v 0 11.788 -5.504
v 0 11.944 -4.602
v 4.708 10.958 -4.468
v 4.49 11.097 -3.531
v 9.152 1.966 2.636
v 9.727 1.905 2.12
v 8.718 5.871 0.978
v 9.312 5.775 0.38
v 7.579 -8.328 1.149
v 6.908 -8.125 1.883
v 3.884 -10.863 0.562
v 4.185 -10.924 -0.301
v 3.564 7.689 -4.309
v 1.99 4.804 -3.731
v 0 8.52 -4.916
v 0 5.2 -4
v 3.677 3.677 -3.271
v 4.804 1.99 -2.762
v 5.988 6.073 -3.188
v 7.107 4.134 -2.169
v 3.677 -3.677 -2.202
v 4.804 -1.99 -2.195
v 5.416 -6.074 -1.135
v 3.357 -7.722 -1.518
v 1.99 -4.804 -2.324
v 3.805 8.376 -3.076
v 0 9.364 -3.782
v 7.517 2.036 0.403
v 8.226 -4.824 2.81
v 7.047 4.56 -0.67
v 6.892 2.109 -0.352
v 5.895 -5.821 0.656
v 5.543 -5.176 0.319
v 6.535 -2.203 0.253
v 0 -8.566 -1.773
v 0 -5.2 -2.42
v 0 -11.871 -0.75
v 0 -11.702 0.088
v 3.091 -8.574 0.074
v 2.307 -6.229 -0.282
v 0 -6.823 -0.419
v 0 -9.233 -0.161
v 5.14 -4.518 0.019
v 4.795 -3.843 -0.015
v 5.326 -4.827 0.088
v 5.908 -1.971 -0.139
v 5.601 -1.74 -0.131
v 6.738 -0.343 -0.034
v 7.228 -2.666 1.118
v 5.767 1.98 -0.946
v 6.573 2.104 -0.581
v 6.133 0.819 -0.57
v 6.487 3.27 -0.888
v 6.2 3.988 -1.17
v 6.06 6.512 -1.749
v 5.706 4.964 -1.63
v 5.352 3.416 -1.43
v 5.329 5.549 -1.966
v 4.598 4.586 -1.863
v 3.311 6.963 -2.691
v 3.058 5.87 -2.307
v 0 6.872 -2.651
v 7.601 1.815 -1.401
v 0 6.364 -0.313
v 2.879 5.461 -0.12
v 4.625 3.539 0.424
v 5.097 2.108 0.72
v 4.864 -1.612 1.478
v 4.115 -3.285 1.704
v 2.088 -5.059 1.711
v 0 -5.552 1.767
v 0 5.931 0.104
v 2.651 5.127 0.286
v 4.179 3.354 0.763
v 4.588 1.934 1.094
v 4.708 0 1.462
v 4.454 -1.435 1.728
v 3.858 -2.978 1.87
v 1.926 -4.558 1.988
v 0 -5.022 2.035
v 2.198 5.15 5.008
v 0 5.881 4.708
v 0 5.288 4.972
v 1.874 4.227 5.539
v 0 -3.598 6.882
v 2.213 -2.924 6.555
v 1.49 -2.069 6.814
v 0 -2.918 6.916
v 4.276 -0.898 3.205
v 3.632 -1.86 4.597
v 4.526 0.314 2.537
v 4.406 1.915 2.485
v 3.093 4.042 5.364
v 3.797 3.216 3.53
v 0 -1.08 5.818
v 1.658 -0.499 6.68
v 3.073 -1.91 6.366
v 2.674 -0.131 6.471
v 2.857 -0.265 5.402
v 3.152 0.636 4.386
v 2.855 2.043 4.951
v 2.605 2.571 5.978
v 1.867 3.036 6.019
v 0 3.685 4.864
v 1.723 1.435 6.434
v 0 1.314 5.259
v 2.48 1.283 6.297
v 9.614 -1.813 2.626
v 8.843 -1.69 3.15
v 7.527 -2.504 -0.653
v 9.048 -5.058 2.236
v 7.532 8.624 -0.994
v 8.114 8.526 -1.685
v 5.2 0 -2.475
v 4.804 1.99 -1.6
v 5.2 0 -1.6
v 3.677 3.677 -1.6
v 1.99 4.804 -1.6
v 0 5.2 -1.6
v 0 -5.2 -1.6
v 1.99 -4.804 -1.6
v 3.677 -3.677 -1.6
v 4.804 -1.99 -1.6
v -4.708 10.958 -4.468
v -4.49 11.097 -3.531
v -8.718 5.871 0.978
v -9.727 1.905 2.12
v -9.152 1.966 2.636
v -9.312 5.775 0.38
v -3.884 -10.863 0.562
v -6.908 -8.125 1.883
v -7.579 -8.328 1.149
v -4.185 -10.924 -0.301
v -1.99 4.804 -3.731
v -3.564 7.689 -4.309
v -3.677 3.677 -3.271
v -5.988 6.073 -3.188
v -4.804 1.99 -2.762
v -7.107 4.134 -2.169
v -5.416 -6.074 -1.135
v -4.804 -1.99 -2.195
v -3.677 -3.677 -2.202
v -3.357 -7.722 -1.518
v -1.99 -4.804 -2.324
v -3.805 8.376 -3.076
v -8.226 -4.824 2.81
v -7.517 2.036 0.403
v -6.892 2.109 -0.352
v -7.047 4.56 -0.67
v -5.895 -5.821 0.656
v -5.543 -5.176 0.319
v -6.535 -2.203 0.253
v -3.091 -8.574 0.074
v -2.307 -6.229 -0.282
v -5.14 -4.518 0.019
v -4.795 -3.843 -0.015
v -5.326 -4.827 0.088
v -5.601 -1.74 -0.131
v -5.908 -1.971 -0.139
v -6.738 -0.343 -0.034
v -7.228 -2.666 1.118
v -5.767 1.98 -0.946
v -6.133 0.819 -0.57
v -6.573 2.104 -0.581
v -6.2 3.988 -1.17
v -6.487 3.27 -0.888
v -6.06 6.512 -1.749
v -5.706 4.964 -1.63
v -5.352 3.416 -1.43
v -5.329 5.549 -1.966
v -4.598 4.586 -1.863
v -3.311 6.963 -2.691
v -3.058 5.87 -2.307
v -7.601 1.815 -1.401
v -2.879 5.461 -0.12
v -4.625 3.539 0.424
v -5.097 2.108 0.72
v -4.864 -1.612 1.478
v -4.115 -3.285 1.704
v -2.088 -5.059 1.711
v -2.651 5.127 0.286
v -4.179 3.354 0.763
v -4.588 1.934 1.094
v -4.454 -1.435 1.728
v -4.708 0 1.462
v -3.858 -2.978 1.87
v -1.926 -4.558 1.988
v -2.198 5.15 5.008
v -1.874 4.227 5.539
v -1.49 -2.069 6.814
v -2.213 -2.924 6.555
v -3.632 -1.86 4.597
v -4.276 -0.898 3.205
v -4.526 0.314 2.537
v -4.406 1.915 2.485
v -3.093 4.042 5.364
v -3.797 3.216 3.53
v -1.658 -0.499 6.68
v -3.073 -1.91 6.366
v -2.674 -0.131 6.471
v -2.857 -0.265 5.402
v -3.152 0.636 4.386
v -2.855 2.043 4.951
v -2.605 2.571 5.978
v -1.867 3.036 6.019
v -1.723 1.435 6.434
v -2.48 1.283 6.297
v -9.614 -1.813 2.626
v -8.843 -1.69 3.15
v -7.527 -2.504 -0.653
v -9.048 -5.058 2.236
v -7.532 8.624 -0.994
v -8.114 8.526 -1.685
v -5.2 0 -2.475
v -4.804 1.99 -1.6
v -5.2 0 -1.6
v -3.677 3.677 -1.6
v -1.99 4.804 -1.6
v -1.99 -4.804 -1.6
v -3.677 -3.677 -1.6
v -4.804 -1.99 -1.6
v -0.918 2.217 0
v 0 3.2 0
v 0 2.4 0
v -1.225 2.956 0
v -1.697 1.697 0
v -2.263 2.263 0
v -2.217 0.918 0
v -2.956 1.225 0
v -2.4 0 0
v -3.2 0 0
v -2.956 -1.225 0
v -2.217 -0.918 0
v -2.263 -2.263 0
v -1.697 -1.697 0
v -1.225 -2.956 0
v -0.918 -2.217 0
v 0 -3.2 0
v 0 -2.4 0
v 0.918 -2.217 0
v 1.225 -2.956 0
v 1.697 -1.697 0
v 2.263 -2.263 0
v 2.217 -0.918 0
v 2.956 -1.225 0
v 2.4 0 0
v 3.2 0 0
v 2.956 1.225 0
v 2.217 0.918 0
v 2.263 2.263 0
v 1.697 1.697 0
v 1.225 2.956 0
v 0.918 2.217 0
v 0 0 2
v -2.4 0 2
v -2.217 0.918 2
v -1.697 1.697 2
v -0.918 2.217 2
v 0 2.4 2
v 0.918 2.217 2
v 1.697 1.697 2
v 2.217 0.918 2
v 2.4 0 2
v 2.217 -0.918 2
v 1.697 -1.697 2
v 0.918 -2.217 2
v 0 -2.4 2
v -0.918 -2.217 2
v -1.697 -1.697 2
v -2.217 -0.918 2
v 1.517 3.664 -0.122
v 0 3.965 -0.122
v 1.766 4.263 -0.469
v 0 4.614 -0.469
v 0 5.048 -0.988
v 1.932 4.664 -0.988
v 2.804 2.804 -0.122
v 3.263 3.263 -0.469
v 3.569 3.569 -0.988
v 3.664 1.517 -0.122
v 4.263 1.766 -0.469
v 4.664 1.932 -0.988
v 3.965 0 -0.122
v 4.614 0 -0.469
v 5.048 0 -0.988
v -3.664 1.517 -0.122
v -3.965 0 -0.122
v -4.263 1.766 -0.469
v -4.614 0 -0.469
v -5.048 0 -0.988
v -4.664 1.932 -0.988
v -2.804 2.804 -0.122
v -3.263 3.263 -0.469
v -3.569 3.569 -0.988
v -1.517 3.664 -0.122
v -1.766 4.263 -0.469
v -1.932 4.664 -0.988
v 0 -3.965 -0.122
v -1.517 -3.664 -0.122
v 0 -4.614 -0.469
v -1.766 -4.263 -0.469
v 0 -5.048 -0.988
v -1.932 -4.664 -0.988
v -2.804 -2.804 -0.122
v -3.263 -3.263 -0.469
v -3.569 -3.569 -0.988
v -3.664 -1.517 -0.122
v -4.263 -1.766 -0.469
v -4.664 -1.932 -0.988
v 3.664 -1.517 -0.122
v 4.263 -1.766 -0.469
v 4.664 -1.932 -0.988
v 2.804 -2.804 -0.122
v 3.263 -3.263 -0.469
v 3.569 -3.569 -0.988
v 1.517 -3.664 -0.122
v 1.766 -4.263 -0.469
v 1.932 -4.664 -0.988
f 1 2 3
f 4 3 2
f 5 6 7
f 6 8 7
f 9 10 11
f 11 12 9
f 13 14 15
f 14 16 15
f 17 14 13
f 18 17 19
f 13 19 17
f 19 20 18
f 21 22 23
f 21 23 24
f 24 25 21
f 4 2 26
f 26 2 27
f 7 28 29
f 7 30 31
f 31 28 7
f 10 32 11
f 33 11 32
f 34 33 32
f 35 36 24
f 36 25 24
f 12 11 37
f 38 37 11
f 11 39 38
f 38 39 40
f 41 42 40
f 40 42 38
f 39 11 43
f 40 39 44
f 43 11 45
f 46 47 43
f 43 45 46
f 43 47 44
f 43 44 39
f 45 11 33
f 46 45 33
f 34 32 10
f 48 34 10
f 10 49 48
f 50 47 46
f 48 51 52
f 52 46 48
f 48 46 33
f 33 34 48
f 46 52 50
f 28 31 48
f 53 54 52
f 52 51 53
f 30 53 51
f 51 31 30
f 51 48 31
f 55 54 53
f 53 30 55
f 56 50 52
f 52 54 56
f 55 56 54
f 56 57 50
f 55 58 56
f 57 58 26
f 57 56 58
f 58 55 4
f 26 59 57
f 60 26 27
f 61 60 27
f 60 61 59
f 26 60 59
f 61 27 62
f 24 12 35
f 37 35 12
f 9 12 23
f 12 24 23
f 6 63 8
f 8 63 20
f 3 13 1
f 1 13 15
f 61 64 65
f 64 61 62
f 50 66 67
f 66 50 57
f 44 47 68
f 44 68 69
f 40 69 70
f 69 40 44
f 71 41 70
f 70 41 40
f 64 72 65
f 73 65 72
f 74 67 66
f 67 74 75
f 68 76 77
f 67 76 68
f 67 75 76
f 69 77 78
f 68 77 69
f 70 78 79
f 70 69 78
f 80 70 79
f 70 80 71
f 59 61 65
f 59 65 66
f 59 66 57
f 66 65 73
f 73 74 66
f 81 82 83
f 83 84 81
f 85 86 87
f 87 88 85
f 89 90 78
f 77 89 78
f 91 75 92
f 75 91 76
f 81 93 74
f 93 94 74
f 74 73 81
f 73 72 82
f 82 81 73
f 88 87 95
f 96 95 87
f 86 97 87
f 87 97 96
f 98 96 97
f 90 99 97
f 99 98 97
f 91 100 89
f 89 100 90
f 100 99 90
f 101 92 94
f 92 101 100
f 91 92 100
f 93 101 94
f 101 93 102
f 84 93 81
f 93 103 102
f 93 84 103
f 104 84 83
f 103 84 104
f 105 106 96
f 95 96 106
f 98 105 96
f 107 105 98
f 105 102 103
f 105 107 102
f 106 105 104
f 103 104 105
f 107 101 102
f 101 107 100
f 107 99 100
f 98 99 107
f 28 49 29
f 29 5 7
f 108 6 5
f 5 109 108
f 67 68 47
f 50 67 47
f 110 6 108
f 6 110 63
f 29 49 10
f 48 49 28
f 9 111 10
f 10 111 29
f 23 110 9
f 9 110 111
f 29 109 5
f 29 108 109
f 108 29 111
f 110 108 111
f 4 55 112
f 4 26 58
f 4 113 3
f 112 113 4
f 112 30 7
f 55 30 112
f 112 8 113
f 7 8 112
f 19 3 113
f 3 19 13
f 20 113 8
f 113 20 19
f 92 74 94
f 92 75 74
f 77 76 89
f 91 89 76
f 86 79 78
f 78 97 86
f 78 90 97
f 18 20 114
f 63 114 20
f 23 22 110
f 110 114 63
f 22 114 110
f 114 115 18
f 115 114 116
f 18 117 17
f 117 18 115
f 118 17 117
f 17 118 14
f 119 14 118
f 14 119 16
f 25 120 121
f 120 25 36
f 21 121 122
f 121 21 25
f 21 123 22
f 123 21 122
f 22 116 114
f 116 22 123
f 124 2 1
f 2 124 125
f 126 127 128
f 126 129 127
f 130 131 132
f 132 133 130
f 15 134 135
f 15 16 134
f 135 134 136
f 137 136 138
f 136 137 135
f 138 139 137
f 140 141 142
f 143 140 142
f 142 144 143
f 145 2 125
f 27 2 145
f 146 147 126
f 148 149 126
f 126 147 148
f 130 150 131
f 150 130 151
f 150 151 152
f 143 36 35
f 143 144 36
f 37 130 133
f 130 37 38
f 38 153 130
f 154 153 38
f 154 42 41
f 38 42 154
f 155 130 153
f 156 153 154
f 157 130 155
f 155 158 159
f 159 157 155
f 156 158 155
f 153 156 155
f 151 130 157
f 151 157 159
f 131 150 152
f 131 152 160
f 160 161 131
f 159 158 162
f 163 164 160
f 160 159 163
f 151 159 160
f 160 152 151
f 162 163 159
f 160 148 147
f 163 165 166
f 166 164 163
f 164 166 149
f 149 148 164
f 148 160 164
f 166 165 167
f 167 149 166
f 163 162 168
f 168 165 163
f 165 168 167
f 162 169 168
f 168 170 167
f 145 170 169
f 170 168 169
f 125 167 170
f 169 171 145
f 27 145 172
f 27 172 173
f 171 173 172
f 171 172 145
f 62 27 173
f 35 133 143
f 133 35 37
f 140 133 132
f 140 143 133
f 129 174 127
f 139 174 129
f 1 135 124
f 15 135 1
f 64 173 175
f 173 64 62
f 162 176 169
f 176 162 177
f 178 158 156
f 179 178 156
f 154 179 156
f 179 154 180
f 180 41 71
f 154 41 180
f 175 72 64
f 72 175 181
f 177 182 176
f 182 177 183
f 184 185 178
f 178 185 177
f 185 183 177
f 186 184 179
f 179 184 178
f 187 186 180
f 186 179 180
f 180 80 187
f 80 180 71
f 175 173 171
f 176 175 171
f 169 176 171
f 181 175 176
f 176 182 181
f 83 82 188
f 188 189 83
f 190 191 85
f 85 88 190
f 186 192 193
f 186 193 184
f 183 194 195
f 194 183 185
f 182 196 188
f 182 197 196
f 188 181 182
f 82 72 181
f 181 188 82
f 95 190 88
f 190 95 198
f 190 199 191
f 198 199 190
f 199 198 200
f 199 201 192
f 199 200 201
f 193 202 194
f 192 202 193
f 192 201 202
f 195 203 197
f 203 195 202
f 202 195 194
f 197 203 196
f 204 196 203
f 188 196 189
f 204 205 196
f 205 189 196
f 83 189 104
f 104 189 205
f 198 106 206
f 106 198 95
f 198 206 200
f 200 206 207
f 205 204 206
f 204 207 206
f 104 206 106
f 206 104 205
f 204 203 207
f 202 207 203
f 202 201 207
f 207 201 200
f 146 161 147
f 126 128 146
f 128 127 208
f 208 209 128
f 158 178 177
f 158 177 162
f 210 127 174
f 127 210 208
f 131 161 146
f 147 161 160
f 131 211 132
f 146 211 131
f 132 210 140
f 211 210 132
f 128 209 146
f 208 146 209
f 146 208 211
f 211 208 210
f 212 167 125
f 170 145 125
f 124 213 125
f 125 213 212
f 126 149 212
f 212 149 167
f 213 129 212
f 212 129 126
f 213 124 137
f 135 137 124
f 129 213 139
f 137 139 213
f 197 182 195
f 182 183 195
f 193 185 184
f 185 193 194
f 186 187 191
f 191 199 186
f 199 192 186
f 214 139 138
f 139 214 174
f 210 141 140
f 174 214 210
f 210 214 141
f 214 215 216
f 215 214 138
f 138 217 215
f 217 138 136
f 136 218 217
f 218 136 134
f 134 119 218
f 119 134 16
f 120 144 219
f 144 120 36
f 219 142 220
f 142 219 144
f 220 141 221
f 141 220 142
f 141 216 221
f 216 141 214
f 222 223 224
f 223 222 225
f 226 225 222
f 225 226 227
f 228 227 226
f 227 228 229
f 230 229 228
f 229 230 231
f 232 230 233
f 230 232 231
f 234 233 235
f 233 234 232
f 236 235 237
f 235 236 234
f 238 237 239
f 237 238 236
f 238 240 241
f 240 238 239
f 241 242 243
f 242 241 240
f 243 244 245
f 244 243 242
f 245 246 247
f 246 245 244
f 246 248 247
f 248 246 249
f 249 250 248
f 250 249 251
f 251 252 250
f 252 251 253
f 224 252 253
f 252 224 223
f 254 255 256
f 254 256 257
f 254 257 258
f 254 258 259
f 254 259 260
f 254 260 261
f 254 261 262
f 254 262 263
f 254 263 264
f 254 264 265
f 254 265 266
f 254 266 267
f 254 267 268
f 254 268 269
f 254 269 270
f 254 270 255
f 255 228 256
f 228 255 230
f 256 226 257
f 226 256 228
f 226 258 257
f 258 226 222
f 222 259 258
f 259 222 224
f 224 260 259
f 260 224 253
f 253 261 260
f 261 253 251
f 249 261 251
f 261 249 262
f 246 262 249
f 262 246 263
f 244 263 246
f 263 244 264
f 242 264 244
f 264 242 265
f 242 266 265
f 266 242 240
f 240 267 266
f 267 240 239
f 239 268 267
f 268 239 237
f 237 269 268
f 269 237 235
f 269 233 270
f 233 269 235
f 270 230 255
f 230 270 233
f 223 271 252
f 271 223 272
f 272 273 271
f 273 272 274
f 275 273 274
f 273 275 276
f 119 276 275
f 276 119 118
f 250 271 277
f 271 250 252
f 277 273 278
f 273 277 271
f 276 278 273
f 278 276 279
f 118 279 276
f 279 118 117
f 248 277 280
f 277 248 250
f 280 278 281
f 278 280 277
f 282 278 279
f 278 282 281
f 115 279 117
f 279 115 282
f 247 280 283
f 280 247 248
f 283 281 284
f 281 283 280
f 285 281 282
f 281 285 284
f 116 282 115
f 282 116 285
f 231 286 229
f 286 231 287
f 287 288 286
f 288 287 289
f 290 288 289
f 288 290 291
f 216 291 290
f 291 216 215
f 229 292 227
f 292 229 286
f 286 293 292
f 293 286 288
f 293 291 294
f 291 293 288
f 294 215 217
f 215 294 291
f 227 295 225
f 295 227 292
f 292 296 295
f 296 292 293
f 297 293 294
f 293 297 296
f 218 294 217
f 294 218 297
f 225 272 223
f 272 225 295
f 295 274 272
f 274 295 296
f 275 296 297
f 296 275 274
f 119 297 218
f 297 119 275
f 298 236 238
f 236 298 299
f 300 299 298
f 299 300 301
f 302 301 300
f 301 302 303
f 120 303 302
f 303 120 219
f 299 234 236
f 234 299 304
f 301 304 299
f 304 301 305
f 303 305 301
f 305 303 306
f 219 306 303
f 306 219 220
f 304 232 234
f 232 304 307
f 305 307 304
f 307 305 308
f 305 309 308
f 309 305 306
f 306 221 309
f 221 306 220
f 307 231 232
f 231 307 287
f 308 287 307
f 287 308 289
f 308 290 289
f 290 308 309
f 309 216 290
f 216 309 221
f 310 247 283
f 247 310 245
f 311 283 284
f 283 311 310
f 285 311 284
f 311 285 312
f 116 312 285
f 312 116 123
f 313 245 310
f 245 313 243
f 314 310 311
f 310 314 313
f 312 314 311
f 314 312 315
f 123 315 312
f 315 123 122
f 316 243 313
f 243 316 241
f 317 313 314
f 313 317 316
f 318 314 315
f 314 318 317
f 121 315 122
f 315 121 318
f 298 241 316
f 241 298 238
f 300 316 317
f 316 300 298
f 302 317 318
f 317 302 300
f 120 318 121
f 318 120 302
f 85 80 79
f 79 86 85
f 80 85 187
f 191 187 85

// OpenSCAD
use <../lib.scad>
use <s/15424s01.scad>
function ldraw_lib__15424() = [
// 0 Minifig Hat Cowboy Type 2
// 0 Name: 15424.dat
// 0 Author: Magnus Forsberg [MagFors]
// 0 !LDRAW_ORG Part UPDATE 2023-01
// 0 !LICENSE Licensed under CC BY 4.0 : see CAreadme.txt
// 
// 0 BFC CERTIFY CCW
  [0,"BFC","CERTIFY"],
  [0,"BFC","CCW"],
// 
// 0 !CATEGORY Minifig Headwear
// 
// 0 !HISTORY 2014-05-16 {LEGO Digital Designer} Original part shape
// 0 !HISTORY 2021-09-22 [MagFors] File preparation for LDraw Parts Tracker
// 0 !HISTORY 2023-03-05 [OrionP] Official Update 2023-01
// 
// 
// 1 16 0 0 0 1 0 0 0 1 0 0 0 1 s\15424s01.dat
  [1,16,0,0,0,1,0,0,0,1,0,0,0,1, ldraw_lib__s__15424s01()],
// 3 16 0 -17.205 -8.995 0 -5.087 -12.554 4.815 -4.971 -11.394
  [3,16,0,-17.205,-8.995,0,-5.087,-12.554,4.815,-4.971,-11.394],
// 3 16 4.815 -4.971 -11.394 5.533 -16.387 -7.311 0 -17.205 -8.995
  [3,16,4.815,-4.971,-11.394,5.533,-16.387,-7.311,0,-17.205,-8.995],
// 3 16 0 -5.087 -12.554 0 -17.205 -8.995 -4.815 -4.971 -11.394
  [3,16,0,-5.087,-12.554,0,-17.205,-8.995,-4.815,-4.971,-11.394],
// 3 16 -5.533 -16.387 -7.311 -4.815 -4.971 -11.394 0 -17.205 -8.995
  [3,16,-5.533,-16.387,-7.311,-4.815,-4.971,-11.394,0,-17.205,-8.995],
];
module ldraw_lib__15424(step=0, col=false, unit=2/5, alt=false, line=0.2, solid=!$preview)
    makepoly(ldraw_lib__15424(), step=step, col=col, unit=unit, alt=alt, line=line, solid=solid);
ldraw_lib__15424(line=0.2);
